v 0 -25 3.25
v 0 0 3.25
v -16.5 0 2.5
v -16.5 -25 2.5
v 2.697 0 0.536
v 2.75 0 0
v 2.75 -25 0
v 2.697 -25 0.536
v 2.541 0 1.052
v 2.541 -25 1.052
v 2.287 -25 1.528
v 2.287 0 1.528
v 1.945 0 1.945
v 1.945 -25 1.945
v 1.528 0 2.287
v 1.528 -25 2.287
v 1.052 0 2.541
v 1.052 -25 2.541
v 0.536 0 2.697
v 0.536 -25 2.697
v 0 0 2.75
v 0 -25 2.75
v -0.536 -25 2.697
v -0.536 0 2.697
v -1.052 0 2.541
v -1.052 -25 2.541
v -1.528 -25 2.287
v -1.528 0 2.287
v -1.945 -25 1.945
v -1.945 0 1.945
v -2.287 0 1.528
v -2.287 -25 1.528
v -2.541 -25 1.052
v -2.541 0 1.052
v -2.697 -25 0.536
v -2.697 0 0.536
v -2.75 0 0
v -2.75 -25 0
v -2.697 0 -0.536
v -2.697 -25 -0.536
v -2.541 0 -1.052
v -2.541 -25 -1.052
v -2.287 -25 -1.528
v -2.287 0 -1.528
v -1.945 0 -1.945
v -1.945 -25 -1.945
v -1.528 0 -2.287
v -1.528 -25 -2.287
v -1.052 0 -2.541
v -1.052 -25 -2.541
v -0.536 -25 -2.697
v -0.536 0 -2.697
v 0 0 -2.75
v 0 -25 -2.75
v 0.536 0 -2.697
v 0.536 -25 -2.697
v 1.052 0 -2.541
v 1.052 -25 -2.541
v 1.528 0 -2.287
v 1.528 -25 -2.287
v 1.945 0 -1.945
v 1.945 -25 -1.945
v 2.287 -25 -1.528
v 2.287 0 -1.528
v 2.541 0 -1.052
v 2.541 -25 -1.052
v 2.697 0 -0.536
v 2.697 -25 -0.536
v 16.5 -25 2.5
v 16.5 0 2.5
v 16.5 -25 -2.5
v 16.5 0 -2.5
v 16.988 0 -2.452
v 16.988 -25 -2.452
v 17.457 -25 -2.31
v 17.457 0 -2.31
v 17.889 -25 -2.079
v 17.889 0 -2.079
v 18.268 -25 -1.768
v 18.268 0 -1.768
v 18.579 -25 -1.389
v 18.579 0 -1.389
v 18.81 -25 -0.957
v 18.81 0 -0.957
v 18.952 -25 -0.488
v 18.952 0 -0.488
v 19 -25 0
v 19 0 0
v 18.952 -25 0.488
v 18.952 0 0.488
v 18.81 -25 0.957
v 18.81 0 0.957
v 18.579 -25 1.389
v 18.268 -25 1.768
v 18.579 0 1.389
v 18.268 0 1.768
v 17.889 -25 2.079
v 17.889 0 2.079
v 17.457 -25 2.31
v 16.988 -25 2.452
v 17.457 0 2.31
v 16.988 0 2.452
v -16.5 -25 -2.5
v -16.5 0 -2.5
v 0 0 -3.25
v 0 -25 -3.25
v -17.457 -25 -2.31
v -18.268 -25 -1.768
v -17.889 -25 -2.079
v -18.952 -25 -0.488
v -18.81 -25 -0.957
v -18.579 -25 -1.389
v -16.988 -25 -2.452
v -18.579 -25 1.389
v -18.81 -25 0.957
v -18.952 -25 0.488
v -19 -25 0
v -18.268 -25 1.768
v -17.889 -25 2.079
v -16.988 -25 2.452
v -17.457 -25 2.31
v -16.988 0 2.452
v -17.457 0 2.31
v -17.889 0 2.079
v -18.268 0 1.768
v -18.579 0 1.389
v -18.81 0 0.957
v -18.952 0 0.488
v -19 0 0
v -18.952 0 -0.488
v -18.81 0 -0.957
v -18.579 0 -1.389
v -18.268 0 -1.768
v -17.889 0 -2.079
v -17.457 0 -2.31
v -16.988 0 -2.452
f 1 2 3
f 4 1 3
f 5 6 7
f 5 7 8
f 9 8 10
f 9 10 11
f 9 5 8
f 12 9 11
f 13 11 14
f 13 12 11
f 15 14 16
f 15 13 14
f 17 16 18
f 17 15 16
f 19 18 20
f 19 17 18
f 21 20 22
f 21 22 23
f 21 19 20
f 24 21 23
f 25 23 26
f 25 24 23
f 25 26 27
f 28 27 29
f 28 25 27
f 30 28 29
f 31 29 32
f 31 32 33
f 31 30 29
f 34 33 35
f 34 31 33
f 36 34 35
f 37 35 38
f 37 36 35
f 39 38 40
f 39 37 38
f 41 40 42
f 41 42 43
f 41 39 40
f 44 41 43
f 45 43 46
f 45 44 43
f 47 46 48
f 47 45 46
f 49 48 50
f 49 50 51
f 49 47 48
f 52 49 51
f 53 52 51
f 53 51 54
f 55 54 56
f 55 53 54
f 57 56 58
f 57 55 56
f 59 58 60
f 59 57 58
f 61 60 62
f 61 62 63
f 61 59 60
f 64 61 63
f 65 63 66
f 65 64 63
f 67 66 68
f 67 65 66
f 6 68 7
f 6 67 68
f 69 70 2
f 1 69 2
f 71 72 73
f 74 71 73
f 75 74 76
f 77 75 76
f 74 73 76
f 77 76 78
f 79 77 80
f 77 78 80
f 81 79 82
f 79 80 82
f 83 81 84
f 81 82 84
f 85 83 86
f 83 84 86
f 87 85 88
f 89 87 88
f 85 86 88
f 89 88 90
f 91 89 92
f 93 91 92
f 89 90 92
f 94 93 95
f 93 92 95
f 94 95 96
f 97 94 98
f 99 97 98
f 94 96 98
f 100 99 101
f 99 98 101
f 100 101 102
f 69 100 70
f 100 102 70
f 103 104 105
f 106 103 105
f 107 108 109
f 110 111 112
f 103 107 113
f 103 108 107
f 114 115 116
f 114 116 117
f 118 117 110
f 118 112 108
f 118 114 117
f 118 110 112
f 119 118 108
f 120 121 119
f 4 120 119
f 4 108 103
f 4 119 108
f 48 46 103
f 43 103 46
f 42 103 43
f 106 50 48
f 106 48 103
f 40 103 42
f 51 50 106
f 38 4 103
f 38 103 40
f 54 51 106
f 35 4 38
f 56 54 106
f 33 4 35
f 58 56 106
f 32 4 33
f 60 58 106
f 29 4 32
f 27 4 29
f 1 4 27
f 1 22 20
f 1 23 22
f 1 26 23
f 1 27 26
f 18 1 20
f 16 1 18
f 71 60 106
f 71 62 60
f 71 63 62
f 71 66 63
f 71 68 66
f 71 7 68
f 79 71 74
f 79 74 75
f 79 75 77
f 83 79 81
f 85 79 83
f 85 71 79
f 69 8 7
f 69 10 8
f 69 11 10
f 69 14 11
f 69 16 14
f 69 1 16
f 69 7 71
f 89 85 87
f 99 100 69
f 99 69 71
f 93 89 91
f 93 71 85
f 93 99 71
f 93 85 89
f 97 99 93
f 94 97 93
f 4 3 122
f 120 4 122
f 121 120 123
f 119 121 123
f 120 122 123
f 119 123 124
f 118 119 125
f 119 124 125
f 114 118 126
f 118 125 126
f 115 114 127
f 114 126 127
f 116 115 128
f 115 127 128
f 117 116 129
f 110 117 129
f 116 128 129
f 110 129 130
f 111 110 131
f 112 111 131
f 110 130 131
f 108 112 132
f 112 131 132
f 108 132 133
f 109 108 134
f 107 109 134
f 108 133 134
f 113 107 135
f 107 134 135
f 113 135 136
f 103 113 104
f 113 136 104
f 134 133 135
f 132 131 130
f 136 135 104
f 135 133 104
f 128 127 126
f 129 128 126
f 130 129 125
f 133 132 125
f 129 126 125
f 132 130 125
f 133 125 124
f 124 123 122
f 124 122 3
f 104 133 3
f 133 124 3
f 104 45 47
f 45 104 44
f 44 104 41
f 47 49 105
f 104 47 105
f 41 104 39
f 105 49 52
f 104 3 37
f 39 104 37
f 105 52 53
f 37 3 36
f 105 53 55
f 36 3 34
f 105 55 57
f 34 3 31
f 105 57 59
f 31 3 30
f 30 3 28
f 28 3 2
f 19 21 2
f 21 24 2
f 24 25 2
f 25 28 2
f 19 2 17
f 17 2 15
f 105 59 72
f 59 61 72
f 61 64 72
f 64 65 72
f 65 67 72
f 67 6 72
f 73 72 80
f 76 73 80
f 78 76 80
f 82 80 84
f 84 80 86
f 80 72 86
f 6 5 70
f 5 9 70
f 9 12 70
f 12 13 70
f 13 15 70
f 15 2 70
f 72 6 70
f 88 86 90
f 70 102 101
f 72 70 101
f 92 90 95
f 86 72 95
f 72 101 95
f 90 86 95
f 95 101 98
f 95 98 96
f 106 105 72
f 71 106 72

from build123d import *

# Parameters (mm, degrees)
F0_R     = 2.75
F1_DEPTH = 25


# Not quite as in the source:
# - a feature of the source that left no trace in its solid (it failed there, or was rolled back) is left out


with BuildPart() as f1:
    # F0 (on Front) → F1 (new body)
    with BuildSketch(Plane.XZ):
        Polygon((0, 3.25), (-16.5, 2.5), (-16.5, -2.5), (0, -3.25), (16.5, -2.5), (16.5, 2.5), align=None)
        Circle(F0_R, mode=Mode.SUBTRACT)
        with BuildLine():
            Line((-16.5, -2.5), (-16.5, 2.5))
            ThreePointArc((-16.5, 2.5), (-19, 0), (-16.5, -2.5))
        make_face()
        with BuildLine():
            ThreePointArc((16.5, -2.5), (19, 0), (16.5, 2.5))
            Line((16.5, 2.5), (16.5, -2.5))
        make_face()
    extrude(amount=F1_DEPTH)


solid = f1.part
